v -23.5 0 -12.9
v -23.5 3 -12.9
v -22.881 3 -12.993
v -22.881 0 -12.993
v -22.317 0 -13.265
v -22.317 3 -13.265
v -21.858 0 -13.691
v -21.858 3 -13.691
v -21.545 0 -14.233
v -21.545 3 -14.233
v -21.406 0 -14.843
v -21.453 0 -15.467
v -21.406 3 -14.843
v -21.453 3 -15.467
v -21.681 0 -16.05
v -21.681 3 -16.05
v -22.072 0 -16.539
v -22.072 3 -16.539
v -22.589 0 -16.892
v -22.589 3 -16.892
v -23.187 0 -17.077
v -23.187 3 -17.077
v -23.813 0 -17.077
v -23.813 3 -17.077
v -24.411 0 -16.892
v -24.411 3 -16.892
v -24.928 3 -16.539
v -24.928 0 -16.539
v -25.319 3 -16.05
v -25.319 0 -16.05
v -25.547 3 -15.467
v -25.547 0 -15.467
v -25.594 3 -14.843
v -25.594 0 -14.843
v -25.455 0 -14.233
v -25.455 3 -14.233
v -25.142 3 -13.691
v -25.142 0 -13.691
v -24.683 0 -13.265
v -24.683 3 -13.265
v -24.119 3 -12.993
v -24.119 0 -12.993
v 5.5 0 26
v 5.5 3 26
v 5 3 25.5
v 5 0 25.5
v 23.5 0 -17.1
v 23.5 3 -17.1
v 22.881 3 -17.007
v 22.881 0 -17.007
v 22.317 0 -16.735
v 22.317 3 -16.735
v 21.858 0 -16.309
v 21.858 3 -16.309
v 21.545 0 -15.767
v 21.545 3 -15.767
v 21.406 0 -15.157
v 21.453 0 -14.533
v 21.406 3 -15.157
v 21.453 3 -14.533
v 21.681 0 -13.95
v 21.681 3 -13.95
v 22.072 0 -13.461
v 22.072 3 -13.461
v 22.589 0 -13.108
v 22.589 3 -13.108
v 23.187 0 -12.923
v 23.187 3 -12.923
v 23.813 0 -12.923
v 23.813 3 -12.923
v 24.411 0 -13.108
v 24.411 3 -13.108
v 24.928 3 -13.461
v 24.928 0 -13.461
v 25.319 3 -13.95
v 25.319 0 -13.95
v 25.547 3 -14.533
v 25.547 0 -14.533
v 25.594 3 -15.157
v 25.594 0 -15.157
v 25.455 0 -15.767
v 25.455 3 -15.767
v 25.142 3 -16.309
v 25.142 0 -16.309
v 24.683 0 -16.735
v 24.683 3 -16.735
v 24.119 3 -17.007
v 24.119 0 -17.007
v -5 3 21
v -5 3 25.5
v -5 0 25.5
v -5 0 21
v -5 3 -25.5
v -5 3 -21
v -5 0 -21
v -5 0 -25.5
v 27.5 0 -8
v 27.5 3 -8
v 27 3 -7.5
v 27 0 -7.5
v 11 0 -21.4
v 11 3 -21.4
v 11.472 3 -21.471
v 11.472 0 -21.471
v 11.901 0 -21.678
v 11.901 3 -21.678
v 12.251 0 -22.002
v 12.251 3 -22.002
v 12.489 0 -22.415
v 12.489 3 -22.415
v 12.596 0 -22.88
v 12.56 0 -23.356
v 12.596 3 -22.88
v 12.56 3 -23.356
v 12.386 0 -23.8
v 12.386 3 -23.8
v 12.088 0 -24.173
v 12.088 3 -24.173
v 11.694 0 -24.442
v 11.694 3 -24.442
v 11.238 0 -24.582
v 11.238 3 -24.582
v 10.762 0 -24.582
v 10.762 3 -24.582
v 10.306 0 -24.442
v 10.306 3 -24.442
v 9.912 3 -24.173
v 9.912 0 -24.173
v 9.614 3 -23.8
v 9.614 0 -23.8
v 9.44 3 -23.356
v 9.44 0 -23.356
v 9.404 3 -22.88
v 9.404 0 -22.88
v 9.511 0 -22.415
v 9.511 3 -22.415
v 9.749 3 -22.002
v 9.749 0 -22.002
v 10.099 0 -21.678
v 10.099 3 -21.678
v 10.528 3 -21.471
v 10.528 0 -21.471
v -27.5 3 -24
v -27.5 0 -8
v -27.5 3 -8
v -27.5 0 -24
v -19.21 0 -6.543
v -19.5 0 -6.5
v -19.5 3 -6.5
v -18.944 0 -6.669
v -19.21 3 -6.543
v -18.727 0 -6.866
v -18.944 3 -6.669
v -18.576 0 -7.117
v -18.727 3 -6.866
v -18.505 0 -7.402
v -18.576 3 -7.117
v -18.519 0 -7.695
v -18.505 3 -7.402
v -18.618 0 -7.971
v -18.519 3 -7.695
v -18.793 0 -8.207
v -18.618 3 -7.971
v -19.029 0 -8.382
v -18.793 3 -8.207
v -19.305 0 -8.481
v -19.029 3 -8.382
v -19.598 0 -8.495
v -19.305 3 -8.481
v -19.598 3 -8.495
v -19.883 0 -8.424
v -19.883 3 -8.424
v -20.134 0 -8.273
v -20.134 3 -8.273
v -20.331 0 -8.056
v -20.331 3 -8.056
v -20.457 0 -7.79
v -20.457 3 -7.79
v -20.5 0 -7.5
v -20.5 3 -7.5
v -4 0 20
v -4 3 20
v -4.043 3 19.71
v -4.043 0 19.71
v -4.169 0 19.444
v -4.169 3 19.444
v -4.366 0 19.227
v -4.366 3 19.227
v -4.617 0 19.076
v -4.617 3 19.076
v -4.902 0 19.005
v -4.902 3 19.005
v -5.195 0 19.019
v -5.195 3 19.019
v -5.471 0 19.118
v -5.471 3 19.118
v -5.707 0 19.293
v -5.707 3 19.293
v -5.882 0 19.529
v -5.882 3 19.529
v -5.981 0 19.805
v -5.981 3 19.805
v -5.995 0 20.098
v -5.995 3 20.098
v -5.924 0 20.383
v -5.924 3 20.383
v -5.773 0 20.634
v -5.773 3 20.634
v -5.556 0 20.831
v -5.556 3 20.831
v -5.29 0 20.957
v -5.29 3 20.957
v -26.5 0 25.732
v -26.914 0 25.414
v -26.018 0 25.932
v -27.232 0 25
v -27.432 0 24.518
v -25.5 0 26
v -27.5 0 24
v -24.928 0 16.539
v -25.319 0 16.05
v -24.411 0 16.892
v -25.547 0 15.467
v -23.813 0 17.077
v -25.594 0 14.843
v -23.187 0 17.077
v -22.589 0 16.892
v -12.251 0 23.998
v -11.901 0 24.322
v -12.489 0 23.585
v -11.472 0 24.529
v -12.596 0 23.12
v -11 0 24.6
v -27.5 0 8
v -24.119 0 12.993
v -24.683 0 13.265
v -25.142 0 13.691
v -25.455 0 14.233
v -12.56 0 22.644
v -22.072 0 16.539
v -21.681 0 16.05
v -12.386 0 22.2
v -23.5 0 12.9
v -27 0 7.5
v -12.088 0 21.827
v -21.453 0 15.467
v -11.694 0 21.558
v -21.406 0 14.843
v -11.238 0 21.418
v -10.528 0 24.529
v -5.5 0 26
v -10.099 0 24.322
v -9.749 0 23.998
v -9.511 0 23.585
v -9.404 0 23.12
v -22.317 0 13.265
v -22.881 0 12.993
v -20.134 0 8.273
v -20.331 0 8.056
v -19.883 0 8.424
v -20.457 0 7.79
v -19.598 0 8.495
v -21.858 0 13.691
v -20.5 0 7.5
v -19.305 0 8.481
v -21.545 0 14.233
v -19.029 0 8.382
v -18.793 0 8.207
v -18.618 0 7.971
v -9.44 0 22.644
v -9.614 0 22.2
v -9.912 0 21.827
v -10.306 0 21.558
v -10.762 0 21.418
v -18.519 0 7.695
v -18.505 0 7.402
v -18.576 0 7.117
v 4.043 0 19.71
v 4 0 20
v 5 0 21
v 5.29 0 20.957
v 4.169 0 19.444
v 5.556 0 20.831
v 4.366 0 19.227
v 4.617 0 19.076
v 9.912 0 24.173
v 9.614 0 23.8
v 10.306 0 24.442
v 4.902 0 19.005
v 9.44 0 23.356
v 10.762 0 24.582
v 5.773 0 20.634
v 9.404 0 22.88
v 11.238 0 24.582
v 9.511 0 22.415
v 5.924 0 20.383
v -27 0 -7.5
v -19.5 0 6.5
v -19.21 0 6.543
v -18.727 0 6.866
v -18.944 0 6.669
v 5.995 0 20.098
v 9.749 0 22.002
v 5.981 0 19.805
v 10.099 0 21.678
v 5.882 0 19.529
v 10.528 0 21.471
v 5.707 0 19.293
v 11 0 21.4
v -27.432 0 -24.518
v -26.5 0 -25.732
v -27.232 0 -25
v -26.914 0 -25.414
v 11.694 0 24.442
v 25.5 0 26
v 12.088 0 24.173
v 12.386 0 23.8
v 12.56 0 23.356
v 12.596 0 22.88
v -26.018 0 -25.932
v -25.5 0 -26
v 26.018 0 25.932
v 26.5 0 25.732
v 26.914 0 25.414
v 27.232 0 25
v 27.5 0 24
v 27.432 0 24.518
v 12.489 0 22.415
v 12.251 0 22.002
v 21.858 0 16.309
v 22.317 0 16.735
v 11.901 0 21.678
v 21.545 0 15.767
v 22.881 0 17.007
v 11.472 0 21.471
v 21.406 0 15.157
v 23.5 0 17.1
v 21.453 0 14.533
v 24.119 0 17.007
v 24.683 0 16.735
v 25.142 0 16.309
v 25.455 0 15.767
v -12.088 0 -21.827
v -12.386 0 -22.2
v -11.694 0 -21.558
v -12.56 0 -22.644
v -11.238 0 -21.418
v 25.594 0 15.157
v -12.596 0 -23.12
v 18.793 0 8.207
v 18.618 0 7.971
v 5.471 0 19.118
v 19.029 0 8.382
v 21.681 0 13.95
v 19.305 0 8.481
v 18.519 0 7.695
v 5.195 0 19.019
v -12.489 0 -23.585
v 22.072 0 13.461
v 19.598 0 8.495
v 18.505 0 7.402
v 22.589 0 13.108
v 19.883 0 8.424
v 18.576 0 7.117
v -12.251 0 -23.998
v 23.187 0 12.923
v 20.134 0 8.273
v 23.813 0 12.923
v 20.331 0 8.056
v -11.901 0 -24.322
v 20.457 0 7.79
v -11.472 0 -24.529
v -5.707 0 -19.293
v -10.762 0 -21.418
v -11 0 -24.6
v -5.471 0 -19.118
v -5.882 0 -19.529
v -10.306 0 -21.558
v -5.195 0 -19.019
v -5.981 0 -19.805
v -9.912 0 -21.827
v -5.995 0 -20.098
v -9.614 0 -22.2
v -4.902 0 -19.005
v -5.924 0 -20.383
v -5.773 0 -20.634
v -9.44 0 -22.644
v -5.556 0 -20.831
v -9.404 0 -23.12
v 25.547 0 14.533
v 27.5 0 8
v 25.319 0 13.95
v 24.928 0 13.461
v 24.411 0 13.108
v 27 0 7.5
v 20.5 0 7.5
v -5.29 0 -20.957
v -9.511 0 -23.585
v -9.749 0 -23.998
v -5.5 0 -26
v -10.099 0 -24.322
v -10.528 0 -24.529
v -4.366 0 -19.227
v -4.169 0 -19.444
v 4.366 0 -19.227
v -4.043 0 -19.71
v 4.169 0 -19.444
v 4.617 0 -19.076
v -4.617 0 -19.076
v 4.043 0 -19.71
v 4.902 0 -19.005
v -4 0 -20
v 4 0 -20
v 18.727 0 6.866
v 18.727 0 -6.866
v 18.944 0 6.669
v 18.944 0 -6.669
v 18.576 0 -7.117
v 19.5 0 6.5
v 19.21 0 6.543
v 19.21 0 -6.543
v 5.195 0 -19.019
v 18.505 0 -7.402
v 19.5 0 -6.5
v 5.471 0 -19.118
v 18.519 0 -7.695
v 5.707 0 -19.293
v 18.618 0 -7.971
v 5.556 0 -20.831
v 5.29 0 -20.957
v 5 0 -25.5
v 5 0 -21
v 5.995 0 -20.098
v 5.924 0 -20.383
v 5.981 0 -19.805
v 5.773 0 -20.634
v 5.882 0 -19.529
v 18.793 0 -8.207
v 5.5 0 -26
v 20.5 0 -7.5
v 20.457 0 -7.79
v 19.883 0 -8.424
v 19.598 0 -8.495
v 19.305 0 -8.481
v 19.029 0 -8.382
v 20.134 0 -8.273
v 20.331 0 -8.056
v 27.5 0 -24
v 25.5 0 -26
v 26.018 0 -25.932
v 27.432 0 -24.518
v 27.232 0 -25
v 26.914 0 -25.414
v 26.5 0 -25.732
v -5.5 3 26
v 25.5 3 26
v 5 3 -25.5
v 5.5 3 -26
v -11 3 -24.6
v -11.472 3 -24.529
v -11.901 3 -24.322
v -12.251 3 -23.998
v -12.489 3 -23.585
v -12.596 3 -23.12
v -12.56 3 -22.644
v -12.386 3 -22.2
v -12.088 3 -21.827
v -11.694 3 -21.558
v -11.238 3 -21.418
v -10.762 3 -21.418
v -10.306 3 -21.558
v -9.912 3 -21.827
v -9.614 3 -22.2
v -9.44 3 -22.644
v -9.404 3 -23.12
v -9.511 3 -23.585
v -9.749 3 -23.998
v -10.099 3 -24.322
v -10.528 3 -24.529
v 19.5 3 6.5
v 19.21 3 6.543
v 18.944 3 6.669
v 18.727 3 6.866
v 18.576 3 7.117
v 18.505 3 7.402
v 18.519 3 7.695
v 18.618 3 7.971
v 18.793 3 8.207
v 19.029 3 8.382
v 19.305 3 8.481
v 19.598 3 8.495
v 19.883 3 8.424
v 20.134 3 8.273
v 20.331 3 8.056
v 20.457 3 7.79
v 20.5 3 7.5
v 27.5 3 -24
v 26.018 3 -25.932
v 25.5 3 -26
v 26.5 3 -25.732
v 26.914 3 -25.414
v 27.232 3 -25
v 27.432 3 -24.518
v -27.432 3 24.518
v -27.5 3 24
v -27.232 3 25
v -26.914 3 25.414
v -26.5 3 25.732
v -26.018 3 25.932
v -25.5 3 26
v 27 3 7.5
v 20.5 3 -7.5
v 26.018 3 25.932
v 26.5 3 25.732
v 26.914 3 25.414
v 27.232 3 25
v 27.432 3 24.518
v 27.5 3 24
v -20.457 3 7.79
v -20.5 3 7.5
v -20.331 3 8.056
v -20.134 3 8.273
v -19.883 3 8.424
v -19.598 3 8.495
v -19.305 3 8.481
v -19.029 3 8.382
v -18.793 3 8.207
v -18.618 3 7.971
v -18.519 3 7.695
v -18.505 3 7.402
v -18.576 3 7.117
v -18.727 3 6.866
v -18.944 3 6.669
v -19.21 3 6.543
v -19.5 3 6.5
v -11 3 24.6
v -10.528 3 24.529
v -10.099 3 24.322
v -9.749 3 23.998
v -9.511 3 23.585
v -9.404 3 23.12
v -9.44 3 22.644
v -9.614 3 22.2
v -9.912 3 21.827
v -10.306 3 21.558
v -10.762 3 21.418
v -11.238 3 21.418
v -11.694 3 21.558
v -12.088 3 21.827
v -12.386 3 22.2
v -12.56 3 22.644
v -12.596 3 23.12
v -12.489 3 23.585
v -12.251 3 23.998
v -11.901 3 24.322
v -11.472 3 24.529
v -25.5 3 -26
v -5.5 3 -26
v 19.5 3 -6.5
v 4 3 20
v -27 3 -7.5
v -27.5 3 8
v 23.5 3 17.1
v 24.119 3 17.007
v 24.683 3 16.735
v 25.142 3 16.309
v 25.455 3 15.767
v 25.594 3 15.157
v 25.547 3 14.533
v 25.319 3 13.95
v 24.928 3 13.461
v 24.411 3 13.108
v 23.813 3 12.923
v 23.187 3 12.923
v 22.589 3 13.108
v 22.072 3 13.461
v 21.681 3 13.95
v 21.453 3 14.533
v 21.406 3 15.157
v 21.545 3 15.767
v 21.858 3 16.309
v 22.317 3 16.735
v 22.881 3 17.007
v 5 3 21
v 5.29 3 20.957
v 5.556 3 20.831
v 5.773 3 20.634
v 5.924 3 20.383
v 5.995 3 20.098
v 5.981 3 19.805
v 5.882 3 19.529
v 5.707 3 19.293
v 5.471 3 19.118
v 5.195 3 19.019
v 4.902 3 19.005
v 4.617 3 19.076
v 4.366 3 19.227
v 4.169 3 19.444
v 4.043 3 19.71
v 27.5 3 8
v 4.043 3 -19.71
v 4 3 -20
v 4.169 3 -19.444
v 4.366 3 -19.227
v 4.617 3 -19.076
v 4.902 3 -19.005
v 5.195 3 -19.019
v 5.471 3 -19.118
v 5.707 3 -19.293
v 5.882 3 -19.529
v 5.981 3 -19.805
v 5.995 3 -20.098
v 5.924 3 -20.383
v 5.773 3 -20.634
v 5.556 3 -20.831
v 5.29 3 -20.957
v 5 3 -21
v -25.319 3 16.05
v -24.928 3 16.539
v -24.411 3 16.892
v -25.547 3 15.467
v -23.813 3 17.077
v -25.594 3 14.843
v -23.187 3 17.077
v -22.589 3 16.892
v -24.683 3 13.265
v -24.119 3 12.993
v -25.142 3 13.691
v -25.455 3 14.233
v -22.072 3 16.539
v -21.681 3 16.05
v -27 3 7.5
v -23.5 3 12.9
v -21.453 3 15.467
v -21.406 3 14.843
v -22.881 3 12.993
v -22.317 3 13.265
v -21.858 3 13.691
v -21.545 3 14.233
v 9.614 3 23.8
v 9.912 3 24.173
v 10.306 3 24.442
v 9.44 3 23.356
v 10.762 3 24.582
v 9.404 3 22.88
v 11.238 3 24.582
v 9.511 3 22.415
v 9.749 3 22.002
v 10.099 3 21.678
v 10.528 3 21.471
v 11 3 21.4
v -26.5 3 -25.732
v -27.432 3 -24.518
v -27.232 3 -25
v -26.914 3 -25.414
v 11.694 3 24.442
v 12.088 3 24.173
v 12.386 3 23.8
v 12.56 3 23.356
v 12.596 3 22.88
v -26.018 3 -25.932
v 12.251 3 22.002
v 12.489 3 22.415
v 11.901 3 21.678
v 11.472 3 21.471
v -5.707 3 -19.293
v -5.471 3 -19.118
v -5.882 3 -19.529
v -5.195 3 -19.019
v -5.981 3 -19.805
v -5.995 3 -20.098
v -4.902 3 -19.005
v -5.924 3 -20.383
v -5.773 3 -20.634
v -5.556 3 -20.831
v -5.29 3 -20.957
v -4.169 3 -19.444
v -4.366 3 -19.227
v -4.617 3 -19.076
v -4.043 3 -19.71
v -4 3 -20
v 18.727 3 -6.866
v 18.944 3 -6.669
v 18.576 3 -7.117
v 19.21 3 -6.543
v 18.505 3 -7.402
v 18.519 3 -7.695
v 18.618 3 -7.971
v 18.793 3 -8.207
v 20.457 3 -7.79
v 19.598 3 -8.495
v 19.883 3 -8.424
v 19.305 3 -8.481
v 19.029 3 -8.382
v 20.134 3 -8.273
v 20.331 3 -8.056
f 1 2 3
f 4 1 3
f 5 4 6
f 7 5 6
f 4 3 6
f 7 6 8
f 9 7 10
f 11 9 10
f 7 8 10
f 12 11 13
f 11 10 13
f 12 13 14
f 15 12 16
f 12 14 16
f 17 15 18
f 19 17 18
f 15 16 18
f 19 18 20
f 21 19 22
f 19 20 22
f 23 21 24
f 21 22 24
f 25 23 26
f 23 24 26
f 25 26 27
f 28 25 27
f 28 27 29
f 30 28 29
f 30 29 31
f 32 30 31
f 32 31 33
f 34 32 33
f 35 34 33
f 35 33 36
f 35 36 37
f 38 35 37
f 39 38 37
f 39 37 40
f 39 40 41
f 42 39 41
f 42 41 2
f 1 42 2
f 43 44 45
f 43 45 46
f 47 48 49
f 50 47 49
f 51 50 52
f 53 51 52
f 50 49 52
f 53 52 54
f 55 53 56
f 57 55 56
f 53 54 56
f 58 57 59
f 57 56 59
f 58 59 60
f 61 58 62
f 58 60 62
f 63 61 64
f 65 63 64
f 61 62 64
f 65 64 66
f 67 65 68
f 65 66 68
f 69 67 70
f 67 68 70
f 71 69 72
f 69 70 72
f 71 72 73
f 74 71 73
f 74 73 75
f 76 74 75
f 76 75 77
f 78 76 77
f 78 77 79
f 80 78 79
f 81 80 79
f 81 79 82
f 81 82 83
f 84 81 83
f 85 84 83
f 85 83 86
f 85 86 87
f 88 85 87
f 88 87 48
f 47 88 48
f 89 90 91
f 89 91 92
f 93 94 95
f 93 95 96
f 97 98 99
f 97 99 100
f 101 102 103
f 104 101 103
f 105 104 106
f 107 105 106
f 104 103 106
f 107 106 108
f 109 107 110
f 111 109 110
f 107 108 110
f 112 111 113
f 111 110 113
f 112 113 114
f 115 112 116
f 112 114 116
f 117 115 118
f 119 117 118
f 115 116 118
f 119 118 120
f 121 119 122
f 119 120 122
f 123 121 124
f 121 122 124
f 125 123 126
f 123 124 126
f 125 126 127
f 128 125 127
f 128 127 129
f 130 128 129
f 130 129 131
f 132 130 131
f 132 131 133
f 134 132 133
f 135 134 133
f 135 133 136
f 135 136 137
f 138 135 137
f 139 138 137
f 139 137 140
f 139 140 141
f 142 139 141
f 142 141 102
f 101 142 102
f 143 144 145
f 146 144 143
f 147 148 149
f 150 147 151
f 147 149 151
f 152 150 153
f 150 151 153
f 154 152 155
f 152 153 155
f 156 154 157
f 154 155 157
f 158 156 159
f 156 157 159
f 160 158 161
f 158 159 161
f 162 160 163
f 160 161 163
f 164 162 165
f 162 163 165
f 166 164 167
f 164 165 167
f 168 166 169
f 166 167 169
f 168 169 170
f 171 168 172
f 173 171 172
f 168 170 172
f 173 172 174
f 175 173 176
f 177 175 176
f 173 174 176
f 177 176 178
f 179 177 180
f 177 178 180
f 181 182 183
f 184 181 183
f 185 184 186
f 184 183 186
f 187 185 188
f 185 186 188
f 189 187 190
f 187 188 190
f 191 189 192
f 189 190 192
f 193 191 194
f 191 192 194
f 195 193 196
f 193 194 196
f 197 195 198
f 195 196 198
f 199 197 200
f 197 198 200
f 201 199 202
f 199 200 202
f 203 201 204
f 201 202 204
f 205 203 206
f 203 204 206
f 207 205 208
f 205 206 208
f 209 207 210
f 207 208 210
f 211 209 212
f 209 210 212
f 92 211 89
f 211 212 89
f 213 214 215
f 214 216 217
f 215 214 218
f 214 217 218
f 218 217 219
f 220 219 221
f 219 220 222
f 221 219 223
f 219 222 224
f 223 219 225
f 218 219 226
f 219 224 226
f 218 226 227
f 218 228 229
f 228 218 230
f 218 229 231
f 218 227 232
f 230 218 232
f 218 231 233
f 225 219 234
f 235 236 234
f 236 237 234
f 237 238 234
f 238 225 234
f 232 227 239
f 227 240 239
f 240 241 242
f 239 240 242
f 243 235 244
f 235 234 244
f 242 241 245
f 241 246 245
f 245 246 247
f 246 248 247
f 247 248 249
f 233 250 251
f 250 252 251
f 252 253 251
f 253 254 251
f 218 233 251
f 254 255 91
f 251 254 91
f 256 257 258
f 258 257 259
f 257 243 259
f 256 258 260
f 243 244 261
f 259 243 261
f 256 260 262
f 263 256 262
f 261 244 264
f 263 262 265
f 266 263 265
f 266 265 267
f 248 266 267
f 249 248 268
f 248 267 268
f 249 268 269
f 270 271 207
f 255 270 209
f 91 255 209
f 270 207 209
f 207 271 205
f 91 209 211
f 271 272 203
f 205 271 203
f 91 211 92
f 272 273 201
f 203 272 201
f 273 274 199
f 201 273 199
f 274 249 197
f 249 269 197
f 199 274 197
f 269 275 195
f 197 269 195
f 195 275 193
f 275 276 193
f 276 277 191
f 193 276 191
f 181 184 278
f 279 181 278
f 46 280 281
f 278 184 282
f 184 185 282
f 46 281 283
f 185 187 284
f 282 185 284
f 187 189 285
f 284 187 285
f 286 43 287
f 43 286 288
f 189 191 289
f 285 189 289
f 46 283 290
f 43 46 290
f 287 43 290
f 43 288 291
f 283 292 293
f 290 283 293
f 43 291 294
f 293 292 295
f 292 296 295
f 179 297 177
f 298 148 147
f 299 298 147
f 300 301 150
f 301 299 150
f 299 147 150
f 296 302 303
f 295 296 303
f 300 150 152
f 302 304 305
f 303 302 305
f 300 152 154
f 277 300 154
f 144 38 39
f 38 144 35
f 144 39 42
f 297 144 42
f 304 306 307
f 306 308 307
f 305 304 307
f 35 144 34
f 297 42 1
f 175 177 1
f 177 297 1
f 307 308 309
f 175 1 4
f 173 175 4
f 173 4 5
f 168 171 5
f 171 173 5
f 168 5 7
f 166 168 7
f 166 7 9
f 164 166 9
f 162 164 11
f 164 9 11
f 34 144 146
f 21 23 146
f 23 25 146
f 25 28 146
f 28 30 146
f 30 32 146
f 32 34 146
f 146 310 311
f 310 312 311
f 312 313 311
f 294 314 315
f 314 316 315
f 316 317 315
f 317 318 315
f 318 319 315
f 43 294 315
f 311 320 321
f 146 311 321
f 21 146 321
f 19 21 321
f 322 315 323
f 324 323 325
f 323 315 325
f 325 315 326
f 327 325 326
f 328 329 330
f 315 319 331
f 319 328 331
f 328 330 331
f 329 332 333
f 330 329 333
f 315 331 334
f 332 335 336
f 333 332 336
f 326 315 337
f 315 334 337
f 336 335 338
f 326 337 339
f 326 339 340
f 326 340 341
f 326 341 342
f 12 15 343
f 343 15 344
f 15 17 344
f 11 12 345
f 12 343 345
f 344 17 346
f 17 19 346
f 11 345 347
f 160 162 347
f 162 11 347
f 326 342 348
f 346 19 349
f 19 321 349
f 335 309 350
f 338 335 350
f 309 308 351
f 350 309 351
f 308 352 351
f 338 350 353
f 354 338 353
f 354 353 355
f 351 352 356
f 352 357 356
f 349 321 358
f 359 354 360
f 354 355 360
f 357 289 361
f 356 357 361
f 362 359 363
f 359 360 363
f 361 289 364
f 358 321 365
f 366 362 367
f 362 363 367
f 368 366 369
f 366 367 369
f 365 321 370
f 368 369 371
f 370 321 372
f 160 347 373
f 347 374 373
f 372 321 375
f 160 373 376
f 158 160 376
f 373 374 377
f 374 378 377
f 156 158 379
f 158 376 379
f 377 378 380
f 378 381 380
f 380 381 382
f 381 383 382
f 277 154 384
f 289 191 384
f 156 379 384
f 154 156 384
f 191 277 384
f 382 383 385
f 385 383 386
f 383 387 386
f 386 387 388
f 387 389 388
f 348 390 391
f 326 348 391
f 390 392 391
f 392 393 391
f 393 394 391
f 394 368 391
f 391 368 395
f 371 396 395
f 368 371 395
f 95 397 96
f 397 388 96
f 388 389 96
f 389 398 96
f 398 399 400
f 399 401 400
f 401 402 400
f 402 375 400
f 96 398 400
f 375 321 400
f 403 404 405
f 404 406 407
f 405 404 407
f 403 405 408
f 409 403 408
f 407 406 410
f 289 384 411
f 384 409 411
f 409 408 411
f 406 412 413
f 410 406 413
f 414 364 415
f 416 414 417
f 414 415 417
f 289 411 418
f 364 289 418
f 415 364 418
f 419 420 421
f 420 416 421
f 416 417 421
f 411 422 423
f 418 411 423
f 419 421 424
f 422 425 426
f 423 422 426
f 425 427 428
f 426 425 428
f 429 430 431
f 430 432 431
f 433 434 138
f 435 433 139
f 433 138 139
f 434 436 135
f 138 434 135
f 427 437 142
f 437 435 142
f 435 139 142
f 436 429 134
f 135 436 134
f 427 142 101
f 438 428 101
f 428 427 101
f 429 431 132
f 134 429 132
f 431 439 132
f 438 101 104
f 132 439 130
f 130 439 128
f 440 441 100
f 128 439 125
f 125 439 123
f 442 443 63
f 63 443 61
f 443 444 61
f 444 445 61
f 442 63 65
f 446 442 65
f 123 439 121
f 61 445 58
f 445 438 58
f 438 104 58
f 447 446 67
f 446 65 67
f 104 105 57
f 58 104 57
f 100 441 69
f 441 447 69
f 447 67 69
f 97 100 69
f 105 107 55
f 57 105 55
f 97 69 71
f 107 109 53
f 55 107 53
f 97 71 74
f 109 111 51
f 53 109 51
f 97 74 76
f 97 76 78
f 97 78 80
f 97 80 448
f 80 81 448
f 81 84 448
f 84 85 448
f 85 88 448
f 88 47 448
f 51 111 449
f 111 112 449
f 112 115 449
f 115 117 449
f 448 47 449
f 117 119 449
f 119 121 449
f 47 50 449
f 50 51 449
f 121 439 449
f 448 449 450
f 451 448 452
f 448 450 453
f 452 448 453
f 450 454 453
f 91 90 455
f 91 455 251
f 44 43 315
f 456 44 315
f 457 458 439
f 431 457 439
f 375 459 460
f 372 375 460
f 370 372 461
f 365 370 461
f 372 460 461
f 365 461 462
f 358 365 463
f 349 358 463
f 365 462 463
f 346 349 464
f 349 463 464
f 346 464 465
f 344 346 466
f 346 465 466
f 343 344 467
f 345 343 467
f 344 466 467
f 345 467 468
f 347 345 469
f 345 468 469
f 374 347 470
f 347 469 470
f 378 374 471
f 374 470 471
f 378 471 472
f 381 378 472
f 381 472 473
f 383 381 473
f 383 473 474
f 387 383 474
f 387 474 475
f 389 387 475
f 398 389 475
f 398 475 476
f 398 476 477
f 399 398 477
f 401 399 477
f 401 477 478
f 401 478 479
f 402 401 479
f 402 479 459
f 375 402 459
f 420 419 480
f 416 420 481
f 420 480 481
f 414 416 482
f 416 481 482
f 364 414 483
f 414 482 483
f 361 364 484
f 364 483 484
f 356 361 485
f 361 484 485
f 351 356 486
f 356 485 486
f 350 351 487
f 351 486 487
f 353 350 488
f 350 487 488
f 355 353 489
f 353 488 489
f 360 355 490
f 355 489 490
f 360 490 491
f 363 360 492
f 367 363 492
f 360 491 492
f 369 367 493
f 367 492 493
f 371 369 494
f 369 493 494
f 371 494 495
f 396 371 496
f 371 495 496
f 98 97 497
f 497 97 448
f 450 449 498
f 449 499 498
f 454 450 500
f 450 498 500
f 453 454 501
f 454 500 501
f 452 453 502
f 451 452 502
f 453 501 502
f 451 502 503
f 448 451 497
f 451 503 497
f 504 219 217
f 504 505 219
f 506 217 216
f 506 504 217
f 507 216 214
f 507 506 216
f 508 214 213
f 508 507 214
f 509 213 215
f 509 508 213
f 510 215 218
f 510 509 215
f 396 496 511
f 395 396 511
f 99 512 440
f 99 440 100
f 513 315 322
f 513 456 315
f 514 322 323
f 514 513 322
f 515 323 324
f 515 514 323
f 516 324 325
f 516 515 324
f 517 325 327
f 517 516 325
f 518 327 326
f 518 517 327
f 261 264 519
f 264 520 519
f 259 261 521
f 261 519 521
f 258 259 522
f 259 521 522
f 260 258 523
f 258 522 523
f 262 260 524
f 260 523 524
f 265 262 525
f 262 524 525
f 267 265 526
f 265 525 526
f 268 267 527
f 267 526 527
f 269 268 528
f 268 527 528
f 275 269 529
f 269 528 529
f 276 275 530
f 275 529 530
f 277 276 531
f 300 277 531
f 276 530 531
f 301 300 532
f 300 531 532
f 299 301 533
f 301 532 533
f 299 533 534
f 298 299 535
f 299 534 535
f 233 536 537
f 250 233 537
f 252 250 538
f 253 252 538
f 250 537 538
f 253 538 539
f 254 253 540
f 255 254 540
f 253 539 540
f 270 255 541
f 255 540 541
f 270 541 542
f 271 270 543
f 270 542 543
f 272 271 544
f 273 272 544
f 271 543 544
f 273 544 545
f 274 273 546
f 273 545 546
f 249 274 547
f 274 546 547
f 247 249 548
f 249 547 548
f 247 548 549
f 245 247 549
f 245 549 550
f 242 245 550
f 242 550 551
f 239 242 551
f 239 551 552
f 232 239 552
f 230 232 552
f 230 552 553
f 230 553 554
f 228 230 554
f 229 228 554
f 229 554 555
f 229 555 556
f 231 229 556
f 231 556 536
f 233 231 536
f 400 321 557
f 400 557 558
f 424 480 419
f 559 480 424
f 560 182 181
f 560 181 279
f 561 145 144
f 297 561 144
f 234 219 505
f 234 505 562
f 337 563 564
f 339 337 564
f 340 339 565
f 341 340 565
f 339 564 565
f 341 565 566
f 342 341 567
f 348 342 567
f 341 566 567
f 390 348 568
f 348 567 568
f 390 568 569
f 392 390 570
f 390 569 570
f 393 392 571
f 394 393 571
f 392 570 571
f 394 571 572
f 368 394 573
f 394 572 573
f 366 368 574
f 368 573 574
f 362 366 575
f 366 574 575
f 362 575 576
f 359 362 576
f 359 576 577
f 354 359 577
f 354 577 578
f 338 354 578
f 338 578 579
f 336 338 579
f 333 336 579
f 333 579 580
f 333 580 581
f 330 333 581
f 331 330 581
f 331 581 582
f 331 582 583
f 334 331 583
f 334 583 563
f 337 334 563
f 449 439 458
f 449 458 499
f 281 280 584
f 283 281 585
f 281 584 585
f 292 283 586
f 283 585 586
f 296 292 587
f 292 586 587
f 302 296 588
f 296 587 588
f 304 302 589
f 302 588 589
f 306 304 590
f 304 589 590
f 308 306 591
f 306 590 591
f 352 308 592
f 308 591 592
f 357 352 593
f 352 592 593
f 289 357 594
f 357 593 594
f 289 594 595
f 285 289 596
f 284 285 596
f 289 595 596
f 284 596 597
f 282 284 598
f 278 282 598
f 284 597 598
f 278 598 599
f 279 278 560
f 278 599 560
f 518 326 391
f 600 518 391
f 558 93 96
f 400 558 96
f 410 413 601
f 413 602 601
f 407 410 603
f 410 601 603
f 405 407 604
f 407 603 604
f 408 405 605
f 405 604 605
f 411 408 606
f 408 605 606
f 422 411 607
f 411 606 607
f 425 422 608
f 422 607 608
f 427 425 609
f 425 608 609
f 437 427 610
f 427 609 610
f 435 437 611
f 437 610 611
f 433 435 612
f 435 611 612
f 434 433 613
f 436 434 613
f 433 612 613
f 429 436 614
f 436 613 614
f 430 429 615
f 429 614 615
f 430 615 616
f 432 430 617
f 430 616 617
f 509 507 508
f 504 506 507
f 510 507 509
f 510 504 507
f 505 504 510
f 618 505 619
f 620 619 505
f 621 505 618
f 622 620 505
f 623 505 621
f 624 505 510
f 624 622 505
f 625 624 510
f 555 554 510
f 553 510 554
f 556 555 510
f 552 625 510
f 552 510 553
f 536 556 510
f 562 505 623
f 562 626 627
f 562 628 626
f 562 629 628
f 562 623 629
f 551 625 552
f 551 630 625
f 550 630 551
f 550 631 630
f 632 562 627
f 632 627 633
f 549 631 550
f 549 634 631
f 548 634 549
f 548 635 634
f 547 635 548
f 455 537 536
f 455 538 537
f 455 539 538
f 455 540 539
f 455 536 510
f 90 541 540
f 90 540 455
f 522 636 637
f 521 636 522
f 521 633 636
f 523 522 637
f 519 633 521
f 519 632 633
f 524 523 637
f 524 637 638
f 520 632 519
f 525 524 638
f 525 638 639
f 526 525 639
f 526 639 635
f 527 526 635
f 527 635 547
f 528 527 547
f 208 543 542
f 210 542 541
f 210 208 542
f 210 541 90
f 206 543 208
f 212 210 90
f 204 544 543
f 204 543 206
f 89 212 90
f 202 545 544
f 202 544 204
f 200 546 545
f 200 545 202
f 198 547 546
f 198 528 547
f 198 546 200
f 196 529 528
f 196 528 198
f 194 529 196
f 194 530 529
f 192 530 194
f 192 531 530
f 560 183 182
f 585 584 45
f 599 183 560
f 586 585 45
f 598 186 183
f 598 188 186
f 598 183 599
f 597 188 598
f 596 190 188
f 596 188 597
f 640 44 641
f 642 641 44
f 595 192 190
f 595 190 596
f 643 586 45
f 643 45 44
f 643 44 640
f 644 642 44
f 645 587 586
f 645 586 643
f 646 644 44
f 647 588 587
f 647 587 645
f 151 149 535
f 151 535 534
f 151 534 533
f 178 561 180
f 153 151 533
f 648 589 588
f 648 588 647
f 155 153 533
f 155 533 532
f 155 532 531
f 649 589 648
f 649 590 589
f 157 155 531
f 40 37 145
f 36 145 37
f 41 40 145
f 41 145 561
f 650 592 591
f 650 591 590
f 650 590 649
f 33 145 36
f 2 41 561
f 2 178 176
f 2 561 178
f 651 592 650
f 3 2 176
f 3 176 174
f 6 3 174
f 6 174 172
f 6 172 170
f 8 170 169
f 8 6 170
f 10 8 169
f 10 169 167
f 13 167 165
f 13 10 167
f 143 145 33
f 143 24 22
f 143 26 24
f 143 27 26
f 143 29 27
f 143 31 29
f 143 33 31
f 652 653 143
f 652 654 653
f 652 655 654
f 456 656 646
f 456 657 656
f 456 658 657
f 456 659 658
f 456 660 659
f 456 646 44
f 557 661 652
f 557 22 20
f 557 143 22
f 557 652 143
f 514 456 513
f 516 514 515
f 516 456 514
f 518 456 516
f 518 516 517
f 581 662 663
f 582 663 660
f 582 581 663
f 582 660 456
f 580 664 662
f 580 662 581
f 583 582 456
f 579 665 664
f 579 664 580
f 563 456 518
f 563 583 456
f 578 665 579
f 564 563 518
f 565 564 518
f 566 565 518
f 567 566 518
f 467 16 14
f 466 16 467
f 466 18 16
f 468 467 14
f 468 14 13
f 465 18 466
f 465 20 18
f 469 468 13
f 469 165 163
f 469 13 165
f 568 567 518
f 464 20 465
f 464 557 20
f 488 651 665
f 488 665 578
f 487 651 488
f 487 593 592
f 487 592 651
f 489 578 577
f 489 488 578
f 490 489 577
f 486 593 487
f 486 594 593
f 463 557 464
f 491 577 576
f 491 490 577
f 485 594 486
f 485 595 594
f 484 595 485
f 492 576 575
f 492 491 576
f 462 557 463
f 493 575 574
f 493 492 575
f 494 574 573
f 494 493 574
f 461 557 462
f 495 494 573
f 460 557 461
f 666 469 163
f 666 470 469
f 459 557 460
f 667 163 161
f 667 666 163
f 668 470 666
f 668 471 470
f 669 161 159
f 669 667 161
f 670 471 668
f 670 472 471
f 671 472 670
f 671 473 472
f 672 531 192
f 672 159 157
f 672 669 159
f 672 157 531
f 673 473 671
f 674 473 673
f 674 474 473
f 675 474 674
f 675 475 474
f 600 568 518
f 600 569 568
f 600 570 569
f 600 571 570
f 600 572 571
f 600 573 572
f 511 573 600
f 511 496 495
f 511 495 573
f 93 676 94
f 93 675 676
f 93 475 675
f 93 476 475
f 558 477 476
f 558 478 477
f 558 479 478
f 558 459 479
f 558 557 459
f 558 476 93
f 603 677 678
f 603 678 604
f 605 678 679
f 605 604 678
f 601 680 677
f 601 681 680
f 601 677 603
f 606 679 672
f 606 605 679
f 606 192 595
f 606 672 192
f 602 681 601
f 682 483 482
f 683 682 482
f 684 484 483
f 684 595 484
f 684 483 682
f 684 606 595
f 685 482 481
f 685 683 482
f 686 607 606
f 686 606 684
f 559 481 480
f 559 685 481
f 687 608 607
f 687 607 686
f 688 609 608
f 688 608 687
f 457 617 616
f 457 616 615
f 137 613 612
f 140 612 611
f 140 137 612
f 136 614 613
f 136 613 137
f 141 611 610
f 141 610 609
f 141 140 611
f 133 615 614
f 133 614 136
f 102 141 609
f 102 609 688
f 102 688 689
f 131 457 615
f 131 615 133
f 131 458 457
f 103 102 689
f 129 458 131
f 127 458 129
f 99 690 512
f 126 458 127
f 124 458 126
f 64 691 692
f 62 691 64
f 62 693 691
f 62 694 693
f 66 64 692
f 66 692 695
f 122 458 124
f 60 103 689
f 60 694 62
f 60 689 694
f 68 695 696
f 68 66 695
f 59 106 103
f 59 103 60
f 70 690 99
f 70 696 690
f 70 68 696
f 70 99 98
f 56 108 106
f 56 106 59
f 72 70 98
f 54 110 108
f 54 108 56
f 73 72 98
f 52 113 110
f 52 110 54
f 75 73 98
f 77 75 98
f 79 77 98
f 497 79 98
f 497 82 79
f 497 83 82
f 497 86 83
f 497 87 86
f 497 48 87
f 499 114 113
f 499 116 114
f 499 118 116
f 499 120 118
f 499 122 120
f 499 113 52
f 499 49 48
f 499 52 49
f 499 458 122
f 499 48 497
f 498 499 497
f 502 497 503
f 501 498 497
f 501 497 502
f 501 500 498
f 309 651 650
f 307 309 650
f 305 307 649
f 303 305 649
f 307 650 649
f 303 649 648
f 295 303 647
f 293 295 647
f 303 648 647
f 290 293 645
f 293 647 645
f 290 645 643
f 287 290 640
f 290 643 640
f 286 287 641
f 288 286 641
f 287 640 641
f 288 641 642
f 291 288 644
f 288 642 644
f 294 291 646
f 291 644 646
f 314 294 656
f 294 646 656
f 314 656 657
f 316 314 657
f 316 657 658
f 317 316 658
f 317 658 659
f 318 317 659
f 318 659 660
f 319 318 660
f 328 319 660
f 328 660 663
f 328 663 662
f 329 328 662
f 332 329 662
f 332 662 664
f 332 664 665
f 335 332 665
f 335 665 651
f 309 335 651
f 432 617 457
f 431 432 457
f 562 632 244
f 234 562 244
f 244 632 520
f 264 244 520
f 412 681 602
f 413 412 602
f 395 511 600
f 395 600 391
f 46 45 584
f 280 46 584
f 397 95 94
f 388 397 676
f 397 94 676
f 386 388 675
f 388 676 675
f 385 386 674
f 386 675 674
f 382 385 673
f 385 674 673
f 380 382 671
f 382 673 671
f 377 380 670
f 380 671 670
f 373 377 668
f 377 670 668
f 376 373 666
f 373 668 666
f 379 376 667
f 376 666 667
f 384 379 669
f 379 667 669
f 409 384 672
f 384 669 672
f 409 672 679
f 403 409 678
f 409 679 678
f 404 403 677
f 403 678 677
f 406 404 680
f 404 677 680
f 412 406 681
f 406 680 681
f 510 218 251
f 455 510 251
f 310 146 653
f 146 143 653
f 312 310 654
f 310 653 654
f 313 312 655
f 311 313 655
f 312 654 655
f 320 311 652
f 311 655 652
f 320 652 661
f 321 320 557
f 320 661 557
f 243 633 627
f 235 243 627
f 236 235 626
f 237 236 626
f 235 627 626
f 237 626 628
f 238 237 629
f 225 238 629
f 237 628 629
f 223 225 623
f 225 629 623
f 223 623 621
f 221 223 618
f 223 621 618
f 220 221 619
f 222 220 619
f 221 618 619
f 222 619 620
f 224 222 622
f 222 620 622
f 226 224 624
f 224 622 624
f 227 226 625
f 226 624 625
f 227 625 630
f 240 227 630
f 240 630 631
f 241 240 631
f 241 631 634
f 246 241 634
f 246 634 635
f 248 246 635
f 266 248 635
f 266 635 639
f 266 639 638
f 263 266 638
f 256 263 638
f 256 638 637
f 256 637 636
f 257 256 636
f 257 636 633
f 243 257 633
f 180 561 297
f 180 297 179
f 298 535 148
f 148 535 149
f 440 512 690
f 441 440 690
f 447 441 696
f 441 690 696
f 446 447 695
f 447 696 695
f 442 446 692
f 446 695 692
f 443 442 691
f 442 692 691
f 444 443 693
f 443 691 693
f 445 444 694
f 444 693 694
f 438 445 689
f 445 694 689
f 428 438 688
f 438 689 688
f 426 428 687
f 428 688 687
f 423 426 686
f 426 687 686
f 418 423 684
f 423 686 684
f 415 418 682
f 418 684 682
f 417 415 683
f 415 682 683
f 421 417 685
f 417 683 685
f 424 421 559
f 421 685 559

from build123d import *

# Parameters (mm, degrees)
SKETCH_1_W          = 55
SKETCH_1_H          = 52
EXTRUDE_1_DEPTH     = 3
SKETCH_2_W          = 10
SKETCH_2_H          = 6
CUT_EXTRUDE_1_DEPTH = 38.963798545
SKETCH_3_R          = 1
CUT_EXTRUDE_2_DEPTH = 38.963798545
SKETCH_4_R          = 1.6
CUT_EXTRUDE_3_DEPTH = 38.963798545
CHAMFER_1_SIZE      = 0.5
SKETCH_5_W          = 8
SKETCH_5_H          = 15
CUT_EXTRUDE_4_DEPTH = 38.963798545
SKETCH_6_R          = 1
CUT_EXTRUDE_5_DEPTH = 38.963798545
SKETCH_7_R          = 2.1
CUT_EXTRUDE_6_DEPTH = 38.963798545
CHAMFER_2_SIZE      = 0.5
FILLET_1_R          = 2


with BuildPart() as part:
    # 草图1 → 凸台-拉伸1 (new body)
    with BuildSketch(Plane(origin=(0, 0, 0), x_dir=(1, 0, 0), z_dir=(0, 1, 0))):
        Rectangle(SKETCH_1_W, SKETCH_1_H)
    extrude(amount=EXTRUDE_1_DEPTH)

    # 草图2 → 切除-拉伸1 (cut, through all)
    with BuildSketch(Plane(origin=(0, 3, 0), x_dir=(1, 0, 0), z_dir=(0, 1, 0))):
        with Locations((0, -23)):
            Rectangle(SKETCH_2_W, SKETCH_2_H)
        with Locations((0, 23)):
            Rectangle(SKETCH_2_W, SKETCH_2_H)
    extrude(amount=-CUT_EXTRUDE_1_DEPTH, mode=Mode.SUBTRACT)

    # 草图3 → 切除-拉伸2 (cut, through all)
    with BuildSketch(Plane(origin=(0, 3, 0), x_dir=(1, 0, 0), z_dir=(0, 1, 0))):
        with Locations((-5, 20)):
            Circle(SKETCH_3_R)
        with Locations((5, 20)):
            Circle(SKETCH_3_R)
        with Locations((-5, -20)):
            Circle(SKETCH_3_R)
        with Locations((5, -20)):
            Circle(SKETCH_3_R)
    extrude(amount=-CUT_EXTRUDE_2_DEPTH, mode=Mode.SUBTRACT)

    # 草图4 → 切除-拉伸3 (cut, through all)
    with BuildSketch(Plane(origin=(0, 3, 0), x_dir=(1, 0, 0), z_dir=(0, 1, 0))):
        with Locations(Location((-11, -23, 0), (0, 0, 270))):
            Circle(SKETCH_4_R)
        with Locations(Location((11, -23, 0), (0, 0, 90))):
            Circle(SKETCH_4_R)
        with Locations(Location((11, 23, 0), (0, 0, 270))):
            Circle(SKETCH_4_R)
        with Locations(Location((-11, 23, 0), (0, 0, 90))):
            Circle(SKETCH_4_R)
    extrude(amount=-CUT_EXTRUDE_3_DEPTH, mode=Mode.SUBTRACT)

    # 倒角1
    chamfer_1_edges = [part.edges().sort_by_distance(p)[0] for p in [
        (5, 1.5, 26),
        (-5, 1.5, 26),
        (-5, 1.5, -26),
        (5, 1.5, -26),
    ]]
    chamfer(chamfer_1_edges, length=CHAMFER_1_SIZE)

    # 草图5 → 切除-拉伸4 (cut, through all)
    with BuildSketch(Plane(origin=(0, 3, 0), x_dir=(1, 0, 0), z_dir=(0, 1, 0))):
        with Locations((-23.5, 0)):
            Rectangle(SKETCH_5_W, SKETCH_5_H)
        with Locations((23.5, 0)):
            Rectangle(SKETCH_5_W, SKETCH_5_H)
    extrude(amount=-CUT_EXTRUDE_4_DEPTH, mode=Mode.SUBTRACT)

    # 草图6 → 切除-拉伸5 (cut, through all)
    with BuildSketch(Plane(origin=(0, 3, 0), x_dir=(1, 0, 0), z_dir=(0, 1, 0))):
        with Locations((19.5, 7.5)):
            Circle(SKETCH_6_R)
        with Locations((19.5, -7.5)):
            Circle(SKETCH_6_R)
        with Locations((-19.5, 7.5)):
            Circle(SKETCH_6_R)
        with Locations((-19.5, -7.5)):
            Circle(SKETCH_6_R)
    extrude(amount=-CUT_EXTRUDE_5_DEPTH, mode=Mode.SUBTRACT)

    # 草图7 → 切除-拉伸6 (cut, through all)
    with BuildSketch(Plane(origin=(0, 3, 0), x_dir=(1, 0, 0), z_dir=(0, 1, 0))):
        with Locations(Location((-23.5, 15, 0), (0, 0, 270))):
            Circle(SKETCH_7_R)
        with Locations(Location((-23.5, -15, 0), (0, 0, 90))):
            Circle(SKETCH_7_R)
        with Locations(Location((23.5, -15, 0), (0, 0, 270))):
            Circle(SKETCH_7_R)
        with Locations(Location((23.5, 15, 0), (0, 0, 90))):
            Circle(SKETCH_7_R)
    extrude(amount=-CUT_EXTRUDE_6_DEPTH, mode=Mode.SUBTRACT)

    # 倒角2
    chamfer_2_edges = [part.edges().sort_by_distance(p)[0] for p in [
        (-27.5, 1.5, 7.5),
        (-27.5, 1.5, -7.5),
        (27.5, 1.5, 7.5),
        (27.5, 1.5, -7.5),
    ]]
    chamfer(chamfer_2_edges, length=CHAMFER_2_SIZE)

    # 圆角1
    fillet_1_edges = [part.edges().sort_by_distance(p)[0] for p in [
        (27.5, 1.5, 26),
        (-27.5, 1.5, 26),
        (-27.5, 1.5, -26),
        (27.5, 1.5, -26),
    ]]
    fillet(fillet_1_edges, radius=FILLET_1_R)


solid = part.part
